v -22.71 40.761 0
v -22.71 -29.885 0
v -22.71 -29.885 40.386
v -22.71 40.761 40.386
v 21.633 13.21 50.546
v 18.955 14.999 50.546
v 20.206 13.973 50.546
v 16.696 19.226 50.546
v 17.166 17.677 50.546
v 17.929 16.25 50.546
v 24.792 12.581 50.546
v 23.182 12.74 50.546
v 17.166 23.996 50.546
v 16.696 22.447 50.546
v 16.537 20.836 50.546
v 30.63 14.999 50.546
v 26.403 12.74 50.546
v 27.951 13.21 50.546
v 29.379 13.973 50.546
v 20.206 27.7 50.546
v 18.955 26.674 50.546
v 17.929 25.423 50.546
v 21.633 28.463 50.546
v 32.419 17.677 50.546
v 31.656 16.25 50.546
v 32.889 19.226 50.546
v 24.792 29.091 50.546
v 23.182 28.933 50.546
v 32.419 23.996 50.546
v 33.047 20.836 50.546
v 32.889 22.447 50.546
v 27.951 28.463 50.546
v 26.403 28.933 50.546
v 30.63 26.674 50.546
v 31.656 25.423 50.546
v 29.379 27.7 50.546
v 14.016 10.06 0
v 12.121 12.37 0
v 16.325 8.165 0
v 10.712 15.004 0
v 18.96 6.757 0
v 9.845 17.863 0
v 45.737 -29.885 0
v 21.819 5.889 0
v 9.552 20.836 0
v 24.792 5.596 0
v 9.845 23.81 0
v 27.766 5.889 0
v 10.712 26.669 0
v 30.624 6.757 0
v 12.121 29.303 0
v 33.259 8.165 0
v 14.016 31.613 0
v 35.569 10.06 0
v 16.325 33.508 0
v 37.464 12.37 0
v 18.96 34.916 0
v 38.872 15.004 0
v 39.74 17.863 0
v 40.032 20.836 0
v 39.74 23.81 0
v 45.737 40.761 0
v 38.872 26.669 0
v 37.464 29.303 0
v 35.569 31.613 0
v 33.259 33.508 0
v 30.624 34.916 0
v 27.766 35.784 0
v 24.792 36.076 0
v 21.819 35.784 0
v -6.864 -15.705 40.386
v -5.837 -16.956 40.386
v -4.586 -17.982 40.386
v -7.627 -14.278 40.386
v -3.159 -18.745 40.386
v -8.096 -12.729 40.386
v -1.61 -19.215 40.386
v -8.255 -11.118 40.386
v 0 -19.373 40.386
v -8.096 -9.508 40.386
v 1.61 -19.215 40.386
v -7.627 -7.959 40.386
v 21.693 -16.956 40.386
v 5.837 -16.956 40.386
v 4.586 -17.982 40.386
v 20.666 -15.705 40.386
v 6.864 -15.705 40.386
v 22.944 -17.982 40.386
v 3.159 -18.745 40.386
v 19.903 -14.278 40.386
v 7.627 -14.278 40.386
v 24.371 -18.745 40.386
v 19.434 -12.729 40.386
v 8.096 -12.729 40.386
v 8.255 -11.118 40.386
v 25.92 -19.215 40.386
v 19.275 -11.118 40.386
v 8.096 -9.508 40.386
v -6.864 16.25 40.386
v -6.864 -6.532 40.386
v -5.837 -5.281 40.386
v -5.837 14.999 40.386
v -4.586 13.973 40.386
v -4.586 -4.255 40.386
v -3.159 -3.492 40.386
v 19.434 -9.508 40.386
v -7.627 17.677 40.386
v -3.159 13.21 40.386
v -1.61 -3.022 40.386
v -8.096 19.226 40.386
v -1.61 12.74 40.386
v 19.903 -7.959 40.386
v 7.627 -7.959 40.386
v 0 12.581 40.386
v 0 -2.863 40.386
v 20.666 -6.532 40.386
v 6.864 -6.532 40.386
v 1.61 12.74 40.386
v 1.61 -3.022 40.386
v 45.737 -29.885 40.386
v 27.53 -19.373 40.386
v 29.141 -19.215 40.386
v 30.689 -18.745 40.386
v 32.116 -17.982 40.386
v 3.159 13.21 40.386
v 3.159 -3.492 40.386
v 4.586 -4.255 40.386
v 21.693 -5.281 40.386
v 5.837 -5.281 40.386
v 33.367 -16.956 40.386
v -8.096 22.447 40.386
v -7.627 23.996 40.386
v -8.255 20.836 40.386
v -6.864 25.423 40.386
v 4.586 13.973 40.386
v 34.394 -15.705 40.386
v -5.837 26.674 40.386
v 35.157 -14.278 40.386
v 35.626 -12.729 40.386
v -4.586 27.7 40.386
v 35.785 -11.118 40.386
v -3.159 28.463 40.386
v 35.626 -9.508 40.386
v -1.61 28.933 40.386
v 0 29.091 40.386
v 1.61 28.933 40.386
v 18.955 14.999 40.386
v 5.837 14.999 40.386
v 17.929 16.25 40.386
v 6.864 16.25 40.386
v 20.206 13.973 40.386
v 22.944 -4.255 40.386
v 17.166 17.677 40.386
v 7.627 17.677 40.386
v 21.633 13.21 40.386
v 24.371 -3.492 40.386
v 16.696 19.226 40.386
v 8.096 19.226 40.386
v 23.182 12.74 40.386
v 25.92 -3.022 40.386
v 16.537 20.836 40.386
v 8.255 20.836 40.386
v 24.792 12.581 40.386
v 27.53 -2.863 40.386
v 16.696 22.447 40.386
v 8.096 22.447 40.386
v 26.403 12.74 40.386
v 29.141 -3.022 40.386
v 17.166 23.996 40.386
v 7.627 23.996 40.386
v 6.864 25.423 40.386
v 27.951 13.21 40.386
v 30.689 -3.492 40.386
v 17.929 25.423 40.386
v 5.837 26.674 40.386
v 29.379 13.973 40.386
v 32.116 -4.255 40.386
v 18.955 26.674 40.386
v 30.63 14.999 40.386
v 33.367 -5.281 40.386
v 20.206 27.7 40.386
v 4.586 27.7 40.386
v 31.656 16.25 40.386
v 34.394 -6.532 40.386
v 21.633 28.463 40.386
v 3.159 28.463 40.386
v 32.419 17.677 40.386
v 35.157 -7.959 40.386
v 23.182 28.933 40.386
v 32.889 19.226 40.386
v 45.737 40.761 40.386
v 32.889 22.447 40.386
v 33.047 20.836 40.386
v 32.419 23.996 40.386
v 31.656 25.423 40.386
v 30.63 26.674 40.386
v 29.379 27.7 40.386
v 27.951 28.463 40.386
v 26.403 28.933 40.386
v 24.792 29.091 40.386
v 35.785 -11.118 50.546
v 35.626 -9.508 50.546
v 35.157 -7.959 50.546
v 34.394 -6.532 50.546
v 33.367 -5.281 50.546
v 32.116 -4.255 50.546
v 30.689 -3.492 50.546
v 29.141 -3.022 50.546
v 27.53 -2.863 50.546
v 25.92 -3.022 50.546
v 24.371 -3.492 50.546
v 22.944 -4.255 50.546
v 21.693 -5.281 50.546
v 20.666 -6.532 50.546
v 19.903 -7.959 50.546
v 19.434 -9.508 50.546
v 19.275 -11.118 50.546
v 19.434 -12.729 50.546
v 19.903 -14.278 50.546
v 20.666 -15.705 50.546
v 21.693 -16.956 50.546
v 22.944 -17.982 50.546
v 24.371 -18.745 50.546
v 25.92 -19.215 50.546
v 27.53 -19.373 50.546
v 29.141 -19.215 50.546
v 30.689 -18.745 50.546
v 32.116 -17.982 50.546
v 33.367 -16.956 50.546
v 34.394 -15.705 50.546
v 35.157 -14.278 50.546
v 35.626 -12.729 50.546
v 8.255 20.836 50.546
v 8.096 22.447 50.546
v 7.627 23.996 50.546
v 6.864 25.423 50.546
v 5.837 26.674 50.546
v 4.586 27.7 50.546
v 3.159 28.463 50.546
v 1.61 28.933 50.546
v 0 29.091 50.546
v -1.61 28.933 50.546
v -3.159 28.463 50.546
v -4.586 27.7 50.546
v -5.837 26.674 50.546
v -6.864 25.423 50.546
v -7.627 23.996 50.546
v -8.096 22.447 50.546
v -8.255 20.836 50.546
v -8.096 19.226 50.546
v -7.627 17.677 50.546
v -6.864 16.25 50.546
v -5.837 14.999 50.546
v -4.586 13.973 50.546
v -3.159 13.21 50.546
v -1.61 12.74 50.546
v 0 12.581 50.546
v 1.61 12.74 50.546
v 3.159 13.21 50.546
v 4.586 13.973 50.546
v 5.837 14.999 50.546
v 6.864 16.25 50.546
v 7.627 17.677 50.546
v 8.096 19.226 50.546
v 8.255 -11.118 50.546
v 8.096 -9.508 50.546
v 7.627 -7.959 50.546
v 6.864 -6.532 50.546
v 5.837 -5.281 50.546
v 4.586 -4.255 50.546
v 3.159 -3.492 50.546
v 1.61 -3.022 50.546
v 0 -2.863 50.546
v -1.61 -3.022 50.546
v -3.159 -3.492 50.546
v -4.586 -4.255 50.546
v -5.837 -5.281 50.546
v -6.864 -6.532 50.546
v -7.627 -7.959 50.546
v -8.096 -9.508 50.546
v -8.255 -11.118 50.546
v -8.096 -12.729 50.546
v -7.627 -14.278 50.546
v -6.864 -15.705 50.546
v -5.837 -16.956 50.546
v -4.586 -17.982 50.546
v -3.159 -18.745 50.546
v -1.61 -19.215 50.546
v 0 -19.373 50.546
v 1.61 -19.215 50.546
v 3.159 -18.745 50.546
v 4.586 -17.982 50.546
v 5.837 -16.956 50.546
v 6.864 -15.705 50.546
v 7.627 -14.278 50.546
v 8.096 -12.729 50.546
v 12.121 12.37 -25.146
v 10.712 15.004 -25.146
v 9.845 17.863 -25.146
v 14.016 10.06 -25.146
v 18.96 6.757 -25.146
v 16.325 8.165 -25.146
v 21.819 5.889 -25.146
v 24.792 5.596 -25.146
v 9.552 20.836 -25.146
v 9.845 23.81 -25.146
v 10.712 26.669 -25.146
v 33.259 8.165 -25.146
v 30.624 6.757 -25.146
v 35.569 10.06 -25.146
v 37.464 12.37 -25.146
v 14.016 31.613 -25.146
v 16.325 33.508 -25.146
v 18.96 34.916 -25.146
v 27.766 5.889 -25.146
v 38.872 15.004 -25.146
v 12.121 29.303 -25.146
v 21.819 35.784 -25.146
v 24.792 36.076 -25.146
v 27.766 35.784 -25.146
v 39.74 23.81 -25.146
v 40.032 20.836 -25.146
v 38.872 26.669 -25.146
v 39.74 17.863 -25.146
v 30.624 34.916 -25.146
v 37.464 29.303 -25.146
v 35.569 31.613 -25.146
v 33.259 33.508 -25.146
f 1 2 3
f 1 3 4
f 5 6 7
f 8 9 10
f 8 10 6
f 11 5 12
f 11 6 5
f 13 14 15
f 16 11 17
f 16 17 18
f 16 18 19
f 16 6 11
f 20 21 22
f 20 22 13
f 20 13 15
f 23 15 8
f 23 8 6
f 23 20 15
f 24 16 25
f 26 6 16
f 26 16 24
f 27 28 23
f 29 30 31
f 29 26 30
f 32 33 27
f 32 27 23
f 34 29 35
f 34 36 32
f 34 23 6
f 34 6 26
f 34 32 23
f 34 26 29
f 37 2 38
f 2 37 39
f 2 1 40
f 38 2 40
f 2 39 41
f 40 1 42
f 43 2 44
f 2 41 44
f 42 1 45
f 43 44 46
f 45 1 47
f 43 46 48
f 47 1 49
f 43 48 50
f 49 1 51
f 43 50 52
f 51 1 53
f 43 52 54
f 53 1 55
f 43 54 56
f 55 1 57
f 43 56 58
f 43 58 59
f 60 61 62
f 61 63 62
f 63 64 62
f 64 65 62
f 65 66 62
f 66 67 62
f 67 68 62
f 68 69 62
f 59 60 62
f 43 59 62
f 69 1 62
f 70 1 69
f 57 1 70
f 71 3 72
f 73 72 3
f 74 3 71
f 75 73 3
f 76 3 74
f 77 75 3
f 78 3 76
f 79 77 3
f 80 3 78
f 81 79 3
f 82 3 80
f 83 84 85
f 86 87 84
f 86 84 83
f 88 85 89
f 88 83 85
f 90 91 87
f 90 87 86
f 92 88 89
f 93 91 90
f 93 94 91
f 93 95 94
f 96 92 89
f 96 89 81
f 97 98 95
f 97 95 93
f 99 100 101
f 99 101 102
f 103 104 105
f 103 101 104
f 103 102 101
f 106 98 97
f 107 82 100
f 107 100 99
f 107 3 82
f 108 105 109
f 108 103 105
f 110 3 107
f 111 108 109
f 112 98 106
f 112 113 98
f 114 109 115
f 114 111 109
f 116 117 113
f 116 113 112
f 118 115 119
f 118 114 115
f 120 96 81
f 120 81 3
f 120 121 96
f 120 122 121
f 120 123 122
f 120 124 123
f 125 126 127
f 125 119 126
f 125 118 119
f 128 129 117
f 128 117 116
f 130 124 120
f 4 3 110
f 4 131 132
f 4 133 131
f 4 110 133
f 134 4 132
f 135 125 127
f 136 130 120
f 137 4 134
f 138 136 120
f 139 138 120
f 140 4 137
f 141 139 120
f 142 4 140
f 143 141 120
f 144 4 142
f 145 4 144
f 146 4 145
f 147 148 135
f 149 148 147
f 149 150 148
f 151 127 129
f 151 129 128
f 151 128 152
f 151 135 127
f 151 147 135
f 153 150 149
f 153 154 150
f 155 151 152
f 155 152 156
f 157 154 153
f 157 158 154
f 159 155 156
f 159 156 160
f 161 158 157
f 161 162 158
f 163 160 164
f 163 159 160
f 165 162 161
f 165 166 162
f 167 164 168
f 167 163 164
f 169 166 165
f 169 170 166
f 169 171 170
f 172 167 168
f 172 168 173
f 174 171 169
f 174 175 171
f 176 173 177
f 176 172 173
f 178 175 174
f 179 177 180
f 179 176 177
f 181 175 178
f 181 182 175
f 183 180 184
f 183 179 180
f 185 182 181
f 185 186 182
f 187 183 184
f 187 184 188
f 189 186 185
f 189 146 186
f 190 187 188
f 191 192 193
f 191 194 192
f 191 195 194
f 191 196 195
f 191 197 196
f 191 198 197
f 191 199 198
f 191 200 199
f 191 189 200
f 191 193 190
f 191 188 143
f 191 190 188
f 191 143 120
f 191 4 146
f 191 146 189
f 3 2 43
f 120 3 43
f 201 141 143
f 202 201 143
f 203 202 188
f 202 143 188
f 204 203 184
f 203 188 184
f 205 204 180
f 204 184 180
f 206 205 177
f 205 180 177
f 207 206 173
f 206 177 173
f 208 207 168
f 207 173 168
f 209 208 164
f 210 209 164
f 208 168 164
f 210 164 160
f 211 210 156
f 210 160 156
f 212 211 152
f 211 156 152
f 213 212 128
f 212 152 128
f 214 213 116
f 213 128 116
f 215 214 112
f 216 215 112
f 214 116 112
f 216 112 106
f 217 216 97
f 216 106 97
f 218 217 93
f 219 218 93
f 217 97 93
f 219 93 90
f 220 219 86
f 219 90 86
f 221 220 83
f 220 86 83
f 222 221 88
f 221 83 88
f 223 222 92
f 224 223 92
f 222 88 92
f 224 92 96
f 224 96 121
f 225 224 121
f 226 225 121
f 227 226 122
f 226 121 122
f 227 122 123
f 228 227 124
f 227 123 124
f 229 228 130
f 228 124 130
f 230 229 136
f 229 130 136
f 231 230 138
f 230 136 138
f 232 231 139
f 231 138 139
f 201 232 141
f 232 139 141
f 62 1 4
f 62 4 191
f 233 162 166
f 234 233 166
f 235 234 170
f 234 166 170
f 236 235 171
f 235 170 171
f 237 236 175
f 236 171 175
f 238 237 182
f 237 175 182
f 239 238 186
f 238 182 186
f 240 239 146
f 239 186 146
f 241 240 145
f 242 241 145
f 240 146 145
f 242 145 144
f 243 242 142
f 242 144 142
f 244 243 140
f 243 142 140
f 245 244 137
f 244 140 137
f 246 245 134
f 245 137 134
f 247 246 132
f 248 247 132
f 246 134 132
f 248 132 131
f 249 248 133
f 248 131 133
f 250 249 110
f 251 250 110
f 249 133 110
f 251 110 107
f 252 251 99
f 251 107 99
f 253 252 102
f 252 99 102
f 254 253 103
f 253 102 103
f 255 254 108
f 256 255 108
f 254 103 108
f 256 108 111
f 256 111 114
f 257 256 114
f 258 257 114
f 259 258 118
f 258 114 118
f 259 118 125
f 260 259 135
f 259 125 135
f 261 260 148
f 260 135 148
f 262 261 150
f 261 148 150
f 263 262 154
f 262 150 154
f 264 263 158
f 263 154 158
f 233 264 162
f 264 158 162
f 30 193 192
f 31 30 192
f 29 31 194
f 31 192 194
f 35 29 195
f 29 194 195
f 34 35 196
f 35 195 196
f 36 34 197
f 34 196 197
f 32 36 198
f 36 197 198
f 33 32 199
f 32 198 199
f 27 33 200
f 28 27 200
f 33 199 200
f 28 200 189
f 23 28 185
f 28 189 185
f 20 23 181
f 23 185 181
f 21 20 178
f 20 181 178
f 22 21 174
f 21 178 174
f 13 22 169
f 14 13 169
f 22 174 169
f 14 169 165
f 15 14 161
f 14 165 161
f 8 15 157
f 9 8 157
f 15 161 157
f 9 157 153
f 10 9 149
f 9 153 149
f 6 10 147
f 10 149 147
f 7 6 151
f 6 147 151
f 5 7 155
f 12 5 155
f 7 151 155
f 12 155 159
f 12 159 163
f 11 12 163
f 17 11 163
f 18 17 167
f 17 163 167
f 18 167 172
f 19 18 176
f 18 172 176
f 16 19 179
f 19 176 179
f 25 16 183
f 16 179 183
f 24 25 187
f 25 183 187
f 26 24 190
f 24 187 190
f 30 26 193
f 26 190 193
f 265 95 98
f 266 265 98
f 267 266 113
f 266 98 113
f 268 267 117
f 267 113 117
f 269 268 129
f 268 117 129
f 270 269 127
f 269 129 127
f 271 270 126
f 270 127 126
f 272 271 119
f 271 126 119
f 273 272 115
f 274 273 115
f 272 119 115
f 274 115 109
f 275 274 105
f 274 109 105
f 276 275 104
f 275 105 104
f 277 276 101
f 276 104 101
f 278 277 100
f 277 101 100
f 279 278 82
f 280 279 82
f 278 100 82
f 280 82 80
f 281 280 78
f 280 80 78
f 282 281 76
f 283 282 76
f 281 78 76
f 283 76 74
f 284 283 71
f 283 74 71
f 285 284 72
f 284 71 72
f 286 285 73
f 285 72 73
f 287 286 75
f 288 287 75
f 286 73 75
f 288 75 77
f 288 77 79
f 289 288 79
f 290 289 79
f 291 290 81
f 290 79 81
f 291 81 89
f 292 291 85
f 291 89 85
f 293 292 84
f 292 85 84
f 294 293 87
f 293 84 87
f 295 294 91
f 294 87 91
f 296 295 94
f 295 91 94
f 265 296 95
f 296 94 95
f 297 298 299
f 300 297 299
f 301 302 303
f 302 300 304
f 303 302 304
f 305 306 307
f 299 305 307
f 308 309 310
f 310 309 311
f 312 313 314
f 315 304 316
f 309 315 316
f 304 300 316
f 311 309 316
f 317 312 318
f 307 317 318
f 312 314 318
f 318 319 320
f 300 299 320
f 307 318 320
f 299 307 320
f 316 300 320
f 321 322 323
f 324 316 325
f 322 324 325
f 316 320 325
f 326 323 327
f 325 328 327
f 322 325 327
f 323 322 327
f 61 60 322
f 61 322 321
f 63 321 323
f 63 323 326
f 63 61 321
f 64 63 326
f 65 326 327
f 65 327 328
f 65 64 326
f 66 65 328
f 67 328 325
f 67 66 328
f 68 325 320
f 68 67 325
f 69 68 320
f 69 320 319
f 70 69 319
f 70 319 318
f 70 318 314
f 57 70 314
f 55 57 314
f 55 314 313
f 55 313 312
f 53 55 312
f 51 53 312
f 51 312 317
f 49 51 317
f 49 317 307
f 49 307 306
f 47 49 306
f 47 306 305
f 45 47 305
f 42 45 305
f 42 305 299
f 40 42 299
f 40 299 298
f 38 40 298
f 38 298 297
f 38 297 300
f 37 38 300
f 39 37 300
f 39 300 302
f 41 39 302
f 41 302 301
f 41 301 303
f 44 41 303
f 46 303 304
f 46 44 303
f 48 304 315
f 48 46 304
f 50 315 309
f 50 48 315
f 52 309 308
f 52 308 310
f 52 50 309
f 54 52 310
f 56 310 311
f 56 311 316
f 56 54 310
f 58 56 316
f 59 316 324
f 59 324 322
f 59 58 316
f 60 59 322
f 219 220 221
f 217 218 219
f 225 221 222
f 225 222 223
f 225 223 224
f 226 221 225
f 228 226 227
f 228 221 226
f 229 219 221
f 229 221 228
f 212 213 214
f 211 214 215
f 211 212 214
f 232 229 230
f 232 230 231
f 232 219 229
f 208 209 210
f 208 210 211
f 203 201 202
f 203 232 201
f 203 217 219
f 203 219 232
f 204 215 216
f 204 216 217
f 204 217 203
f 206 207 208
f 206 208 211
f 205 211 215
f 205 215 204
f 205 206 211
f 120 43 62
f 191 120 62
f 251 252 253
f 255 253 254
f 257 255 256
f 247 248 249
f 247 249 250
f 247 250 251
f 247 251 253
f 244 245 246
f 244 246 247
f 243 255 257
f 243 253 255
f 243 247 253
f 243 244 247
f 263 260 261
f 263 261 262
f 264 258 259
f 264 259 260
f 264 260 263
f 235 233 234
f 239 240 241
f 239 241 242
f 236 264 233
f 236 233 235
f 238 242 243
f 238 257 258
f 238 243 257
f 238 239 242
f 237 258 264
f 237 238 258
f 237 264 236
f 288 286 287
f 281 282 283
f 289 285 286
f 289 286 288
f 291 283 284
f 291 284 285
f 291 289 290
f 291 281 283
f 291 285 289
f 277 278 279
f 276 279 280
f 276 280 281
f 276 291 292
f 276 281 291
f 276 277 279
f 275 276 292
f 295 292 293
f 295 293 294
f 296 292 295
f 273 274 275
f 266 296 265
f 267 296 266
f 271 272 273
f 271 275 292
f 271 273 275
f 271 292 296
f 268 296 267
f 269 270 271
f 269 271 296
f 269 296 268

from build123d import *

# Parameters (mm, degrees)
F0_W     = 68.447597
F0_H     = 70.646504
F1_DEPTH = 40.386
F2_R     = 15.24
F3_DEPTH = 65.532
F4_R     = 8.255
F5_DEPTH = 10.16


with BuildPart() as f1:
    # F0 (on Top) → F1 (new body)
    with BuildSketch(Plane.XY):
        with Locations((11.513501, 5.437753)):
            Rectangle(F0_W, F0_H)
    extrude(amount=F1_DEPTH)

    # F2 (on face) → F3 (join)
    with BuildSketch(Plane.XY.offset(40.386)):
        with Locations((24.792334, 20.836459)):
            Circle(F2_R)
    extrude(amount=-F3_DEPTH)

    # F4 (on face) → F5 (join)
    with BuildSketch(Plane.XY.offset(40.386)):
        with Locations((0, 20.836459)):
            Circle(F4_R)
        with Locations((0, -11.11847)):
            Circle(F4_R)
        with Locations((24.792334, 20.836459)):
            Circle(F4_R)
        with Locations((27.5301, -11.11847)):
            Circle(F4_R)
    extrude(amount=F5_DEPTH)


solid = f1.part
